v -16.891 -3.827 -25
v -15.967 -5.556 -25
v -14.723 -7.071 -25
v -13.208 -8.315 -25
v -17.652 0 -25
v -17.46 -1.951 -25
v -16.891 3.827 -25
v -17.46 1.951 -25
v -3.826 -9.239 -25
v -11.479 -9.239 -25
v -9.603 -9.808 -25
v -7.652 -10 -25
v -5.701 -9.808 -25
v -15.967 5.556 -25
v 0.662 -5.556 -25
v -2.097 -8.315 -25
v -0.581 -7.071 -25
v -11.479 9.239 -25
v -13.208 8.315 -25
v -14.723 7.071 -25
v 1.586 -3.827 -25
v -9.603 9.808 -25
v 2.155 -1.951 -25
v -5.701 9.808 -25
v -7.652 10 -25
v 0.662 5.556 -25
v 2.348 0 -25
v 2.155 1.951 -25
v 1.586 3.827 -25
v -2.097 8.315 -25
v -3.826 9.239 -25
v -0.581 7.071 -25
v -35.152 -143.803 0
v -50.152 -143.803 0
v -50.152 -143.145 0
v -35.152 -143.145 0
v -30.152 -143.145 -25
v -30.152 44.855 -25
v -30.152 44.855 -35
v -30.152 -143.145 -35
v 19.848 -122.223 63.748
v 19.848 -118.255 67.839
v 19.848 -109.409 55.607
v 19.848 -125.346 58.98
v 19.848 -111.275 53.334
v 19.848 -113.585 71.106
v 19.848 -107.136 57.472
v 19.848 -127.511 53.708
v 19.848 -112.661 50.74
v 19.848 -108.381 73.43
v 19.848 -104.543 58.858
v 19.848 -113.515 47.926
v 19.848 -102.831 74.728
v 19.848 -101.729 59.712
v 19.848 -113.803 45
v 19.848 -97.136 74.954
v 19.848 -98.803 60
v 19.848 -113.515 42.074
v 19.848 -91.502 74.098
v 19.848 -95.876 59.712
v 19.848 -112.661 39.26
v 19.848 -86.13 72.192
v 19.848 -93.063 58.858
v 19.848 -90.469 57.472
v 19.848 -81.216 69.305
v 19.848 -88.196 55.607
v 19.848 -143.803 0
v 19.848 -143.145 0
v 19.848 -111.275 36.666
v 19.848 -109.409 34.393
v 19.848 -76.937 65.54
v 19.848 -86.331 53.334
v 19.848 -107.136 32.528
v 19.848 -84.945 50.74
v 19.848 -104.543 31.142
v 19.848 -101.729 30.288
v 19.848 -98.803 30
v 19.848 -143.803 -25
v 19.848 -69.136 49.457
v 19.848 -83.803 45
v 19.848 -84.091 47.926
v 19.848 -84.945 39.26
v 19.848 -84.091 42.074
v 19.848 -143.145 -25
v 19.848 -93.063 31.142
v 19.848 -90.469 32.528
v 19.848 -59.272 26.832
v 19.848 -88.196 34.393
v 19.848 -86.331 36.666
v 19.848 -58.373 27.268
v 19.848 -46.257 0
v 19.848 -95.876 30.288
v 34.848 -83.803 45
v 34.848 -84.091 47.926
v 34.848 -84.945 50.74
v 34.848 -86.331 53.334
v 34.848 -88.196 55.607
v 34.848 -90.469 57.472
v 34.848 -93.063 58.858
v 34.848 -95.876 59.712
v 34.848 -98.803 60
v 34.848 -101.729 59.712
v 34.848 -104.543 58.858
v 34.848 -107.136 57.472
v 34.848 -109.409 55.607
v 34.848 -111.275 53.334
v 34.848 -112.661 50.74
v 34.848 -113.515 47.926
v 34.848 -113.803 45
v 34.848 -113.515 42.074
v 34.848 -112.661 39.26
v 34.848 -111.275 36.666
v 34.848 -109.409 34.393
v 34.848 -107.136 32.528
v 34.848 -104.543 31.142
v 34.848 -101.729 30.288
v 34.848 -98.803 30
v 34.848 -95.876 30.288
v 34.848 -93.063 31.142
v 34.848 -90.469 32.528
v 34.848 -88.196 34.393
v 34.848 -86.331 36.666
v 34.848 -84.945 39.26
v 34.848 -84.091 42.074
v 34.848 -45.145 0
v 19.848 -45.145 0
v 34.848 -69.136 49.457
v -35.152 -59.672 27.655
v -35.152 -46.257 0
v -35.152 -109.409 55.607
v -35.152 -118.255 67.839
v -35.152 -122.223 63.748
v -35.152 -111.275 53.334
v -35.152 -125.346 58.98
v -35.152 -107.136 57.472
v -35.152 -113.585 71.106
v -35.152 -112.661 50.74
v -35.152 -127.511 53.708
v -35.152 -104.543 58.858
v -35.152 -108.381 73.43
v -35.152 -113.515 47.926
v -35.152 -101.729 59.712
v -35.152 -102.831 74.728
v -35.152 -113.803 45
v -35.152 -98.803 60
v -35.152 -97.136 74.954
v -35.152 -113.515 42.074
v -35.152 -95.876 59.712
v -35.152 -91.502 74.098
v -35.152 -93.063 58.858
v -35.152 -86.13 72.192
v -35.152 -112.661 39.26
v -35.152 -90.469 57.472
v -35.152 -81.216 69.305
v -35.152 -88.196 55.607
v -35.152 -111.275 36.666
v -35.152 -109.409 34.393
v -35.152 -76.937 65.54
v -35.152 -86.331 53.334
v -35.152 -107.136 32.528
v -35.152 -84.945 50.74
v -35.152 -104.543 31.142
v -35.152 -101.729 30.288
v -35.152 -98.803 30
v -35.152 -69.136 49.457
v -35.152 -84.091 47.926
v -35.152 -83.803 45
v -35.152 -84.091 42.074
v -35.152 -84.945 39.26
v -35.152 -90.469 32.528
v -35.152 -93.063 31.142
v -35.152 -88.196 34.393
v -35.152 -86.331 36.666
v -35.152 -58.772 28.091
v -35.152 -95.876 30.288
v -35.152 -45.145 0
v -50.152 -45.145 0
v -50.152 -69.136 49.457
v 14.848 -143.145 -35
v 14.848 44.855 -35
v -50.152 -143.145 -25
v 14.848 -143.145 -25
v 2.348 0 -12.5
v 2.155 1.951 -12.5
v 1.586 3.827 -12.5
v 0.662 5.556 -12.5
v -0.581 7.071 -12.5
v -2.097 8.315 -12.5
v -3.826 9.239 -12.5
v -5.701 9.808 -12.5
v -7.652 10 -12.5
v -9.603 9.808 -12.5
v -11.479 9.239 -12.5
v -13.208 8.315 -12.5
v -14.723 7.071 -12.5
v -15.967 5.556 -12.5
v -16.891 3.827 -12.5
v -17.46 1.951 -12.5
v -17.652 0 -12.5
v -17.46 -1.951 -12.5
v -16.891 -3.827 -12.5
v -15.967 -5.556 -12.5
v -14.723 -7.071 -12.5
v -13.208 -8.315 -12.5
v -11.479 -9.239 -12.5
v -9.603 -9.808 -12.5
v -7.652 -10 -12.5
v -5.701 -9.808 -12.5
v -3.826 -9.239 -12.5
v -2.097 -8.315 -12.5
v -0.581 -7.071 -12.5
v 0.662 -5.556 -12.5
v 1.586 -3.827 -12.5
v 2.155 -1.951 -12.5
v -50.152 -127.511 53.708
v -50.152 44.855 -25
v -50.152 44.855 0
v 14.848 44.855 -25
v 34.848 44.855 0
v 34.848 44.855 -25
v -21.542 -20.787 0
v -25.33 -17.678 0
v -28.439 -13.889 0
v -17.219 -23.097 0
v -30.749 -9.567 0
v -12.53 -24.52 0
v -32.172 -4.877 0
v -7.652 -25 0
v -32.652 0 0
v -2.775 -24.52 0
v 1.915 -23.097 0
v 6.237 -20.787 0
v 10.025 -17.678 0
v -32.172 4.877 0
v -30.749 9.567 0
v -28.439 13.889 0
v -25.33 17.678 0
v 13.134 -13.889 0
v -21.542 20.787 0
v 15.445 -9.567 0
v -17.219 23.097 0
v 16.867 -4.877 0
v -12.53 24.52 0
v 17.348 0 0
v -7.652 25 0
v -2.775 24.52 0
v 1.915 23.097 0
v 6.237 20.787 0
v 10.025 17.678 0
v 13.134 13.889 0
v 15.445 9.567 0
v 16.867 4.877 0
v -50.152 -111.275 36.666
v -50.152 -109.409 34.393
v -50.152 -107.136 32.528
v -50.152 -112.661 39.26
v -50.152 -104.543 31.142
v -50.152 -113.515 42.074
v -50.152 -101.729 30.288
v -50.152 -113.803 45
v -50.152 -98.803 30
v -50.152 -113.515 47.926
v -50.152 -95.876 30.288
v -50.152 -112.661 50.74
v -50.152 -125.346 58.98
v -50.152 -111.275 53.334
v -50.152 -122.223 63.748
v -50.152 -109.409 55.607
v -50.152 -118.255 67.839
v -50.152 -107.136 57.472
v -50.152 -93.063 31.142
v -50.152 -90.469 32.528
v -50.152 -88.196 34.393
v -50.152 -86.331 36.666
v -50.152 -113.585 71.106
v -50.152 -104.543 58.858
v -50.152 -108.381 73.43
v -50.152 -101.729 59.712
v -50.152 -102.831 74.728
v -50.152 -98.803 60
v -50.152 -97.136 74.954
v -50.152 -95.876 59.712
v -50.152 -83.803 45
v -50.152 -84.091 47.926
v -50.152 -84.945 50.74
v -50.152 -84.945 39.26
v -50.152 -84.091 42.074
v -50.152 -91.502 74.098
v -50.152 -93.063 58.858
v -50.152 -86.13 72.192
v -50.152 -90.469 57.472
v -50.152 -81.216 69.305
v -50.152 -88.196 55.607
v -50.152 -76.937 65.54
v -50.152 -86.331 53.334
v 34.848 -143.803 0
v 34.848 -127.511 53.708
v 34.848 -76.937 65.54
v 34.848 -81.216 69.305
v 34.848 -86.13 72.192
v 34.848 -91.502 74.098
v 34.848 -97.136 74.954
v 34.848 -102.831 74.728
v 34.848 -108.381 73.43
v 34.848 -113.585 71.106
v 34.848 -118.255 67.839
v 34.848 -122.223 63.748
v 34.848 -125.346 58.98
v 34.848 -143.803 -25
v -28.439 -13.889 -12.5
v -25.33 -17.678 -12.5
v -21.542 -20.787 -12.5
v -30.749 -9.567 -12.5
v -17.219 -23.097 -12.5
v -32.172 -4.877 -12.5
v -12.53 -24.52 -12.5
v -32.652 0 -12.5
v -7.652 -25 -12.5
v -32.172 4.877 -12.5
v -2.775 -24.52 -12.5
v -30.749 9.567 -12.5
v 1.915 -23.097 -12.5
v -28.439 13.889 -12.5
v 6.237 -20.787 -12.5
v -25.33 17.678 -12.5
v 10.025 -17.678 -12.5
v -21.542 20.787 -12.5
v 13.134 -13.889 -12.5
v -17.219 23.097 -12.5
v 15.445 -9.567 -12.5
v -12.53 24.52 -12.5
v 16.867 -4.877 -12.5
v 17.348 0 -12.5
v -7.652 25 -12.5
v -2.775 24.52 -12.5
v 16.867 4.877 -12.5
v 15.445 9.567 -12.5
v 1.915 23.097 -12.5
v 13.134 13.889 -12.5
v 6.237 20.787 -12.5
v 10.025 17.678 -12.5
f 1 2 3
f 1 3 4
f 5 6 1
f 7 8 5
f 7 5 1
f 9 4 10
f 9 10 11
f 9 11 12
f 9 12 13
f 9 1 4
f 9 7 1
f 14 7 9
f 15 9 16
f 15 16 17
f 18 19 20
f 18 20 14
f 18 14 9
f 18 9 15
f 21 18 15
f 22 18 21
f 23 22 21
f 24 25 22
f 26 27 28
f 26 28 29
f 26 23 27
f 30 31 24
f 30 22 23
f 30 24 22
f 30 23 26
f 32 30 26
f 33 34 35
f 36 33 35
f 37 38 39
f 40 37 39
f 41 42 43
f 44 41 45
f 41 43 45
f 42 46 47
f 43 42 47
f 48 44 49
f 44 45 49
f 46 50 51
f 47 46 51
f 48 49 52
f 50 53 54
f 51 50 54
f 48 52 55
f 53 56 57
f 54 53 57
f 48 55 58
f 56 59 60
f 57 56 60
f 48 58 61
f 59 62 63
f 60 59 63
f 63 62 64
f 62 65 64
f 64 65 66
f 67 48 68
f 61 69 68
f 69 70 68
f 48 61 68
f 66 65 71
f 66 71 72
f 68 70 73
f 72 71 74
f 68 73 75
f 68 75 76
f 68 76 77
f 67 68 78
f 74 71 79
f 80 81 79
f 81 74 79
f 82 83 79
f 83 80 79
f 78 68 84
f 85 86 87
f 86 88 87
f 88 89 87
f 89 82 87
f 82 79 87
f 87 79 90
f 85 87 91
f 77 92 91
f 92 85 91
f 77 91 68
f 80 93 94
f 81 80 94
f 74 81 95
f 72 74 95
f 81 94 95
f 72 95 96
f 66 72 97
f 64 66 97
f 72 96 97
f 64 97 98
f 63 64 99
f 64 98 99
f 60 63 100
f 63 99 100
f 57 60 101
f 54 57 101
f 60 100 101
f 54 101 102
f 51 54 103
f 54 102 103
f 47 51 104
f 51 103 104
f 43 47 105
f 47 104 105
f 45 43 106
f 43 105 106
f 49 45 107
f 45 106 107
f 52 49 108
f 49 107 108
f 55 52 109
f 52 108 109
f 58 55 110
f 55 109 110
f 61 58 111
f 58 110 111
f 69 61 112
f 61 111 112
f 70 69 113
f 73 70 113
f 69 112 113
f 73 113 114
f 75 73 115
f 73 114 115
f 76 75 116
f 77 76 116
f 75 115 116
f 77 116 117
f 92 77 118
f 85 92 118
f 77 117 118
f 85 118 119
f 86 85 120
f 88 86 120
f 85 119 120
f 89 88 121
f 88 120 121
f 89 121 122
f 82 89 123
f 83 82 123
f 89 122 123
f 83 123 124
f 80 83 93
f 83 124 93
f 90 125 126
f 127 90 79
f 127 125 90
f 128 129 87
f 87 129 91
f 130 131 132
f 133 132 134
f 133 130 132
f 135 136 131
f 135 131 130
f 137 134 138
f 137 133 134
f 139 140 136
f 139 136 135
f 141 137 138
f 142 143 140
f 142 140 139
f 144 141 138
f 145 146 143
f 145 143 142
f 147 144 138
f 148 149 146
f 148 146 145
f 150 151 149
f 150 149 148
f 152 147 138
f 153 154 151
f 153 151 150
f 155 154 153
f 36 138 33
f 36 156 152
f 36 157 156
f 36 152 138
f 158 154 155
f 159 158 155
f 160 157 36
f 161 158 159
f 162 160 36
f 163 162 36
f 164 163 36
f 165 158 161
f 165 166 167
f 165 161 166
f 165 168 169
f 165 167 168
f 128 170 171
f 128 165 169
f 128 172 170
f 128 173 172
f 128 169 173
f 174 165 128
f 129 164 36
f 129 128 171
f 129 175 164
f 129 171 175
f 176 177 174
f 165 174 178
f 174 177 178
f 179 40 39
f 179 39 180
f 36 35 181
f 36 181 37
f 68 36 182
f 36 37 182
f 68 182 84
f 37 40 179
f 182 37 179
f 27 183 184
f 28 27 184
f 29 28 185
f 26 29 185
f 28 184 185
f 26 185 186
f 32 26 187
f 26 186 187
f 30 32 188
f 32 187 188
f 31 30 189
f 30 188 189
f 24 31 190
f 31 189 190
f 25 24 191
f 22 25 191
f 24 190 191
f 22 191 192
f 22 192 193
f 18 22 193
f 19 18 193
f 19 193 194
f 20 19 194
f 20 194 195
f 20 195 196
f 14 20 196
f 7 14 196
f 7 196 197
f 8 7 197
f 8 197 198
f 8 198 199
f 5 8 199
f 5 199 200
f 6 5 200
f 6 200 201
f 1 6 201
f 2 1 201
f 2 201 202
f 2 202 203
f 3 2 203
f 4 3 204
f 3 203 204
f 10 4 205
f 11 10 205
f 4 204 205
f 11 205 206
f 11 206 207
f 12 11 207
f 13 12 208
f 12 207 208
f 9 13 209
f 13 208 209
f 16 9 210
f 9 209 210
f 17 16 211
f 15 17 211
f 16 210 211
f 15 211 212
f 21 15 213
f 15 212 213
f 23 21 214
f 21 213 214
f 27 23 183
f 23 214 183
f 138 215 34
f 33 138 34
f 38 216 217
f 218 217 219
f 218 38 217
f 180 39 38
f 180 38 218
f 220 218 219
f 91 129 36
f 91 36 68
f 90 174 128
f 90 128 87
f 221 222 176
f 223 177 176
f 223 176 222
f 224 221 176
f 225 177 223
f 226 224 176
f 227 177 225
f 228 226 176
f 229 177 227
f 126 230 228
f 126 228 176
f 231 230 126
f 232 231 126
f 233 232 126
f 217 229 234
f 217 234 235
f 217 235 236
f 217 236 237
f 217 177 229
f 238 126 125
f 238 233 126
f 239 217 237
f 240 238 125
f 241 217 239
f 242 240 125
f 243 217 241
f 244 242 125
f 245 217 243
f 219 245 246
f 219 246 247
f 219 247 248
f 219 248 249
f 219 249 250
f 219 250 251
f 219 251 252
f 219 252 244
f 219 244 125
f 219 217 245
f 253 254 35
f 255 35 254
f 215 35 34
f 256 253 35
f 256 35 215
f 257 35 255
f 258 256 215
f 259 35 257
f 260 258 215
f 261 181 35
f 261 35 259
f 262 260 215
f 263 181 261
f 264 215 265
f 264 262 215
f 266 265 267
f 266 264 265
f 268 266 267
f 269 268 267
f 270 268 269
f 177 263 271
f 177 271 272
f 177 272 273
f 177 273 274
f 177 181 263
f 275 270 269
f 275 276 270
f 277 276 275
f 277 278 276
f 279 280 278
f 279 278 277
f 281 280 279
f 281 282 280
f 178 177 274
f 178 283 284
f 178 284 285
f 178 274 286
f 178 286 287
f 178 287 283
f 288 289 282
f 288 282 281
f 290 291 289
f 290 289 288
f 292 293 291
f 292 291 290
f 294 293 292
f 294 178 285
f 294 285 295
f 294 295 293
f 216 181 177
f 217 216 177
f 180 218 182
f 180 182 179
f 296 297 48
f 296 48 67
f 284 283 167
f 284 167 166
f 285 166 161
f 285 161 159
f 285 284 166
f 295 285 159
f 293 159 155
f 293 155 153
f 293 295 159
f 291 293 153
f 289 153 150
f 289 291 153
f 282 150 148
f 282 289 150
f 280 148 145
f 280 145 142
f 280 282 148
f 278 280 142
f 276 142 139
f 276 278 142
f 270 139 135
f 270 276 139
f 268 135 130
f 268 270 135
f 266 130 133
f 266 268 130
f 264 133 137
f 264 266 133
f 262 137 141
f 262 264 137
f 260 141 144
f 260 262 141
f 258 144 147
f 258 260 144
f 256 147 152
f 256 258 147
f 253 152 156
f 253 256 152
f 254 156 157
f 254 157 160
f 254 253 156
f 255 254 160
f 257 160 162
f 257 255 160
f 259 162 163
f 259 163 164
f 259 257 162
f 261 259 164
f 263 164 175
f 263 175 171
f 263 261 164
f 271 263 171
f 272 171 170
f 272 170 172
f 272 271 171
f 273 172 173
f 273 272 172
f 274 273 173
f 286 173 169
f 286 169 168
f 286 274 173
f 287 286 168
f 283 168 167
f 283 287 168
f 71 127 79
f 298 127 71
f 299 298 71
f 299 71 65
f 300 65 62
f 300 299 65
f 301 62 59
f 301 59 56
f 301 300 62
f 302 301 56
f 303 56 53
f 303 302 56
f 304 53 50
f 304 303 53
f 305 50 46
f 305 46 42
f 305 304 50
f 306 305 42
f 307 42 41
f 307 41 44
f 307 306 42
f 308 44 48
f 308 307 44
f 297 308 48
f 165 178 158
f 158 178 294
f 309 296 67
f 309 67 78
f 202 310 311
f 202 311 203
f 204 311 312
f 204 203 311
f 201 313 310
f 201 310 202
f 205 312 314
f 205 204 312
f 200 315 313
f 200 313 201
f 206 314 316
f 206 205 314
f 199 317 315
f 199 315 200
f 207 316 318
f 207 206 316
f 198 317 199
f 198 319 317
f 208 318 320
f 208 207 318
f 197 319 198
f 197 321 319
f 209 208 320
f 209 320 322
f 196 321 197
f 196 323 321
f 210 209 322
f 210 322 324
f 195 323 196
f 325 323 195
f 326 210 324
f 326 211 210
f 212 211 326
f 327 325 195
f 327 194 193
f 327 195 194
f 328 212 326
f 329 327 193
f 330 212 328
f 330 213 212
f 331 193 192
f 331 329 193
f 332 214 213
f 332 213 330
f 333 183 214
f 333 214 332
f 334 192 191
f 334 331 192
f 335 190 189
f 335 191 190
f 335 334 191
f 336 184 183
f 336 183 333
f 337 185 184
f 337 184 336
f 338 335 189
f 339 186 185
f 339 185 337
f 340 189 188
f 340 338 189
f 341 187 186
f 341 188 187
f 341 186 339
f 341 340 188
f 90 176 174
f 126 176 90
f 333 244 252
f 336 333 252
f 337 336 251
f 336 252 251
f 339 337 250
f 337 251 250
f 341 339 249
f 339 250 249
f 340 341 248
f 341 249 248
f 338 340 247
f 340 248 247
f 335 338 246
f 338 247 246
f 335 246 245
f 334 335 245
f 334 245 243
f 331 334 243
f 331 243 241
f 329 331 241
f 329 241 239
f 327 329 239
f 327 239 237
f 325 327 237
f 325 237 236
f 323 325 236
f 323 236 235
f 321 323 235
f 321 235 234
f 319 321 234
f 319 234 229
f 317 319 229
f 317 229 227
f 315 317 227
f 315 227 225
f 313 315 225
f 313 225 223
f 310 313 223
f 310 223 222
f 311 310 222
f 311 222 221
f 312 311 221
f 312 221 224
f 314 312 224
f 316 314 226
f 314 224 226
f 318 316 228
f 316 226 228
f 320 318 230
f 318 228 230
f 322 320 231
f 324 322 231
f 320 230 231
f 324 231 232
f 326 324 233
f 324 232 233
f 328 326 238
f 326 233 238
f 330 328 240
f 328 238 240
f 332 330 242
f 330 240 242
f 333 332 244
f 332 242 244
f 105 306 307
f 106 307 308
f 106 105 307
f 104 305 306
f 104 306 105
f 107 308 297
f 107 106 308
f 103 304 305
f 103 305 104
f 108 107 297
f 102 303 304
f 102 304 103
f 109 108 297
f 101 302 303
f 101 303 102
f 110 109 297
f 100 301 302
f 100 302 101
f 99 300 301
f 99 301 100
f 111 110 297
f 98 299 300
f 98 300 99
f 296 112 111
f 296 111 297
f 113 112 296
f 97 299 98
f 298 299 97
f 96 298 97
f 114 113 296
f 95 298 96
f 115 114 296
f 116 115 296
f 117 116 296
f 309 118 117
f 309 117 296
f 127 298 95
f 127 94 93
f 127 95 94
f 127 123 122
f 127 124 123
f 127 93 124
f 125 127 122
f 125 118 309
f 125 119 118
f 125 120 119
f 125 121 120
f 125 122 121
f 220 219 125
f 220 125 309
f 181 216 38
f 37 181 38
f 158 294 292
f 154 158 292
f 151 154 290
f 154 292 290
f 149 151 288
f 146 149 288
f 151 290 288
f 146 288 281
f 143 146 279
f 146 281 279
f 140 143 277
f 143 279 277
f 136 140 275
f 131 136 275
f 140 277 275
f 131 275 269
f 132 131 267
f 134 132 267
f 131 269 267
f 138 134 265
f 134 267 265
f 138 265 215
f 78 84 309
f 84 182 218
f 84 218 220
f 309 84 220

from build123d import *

# Parameters (mm, degrees)
SKETCH1_W            = 85
SKETCH1_H            = 90
SKETCH1_R            = 25
BOSS_EXTRUDE1_DEPTH  = 25
SKETCH1_3_R          = 25
SKETCH1_3_R_2        = 10
BOSS_EXTRUDE2_DEPTH  = 25
SKETCH1_5_R          = 10
CUT_EXTRUDE1_DEPTH   = 72.960881466
SKETCH1_6_R          = 25
SKETCH1_6_R_2        = 10
CUT_EXTRUDE2_DEPTH   = 12.5
SKETCH3_R            = 15
SKETCH3_W            = 25
SKETCH3_H            = 98.657332742
BOSS_EXTRUDE3_DEPTH  = 15
SKETCH5_W            = 25
SKETCH5_H            = 98.657332742
CUT_EXTRUDE3_DEPTH   = 15
SKETCH8_W            = 85
SKETCH8_H            = 25
BOSS_EXTRUDE8_DEPTH  = 98
BOSS_EXTRUDE9_DEPTH  = 1
SKETCH12_W           = 45
SKETCH12_H           = 10
BOSS_EXTRUDE11_DEPTH = 188
CUT_EXTRUDE4_DEPTH   = 177.647203174


with BuildPart() as part:
    # Sketch1 → Boss-Extrude1 (new body)
    with BuildSketch(Plane.XY):
        with Locations((-7.652354571, -0.145429363)):
            Rectangle(SKETCH1_W, SKETCH1_H)
        with Locations((-7.652354571, 0)):
            Circle(SKETCH1_R, mode=Mode.SUBTRACT)
    extrude(amount=-BOSS_EXTRUDE1_DEPTH)

    # Sketch3 → Boss-Extrude3 (add)
    # profile 1 of 2: a face of its own
    with BuildSketch(Plane(origin=(34.847645429, 0, 0), x_dir=(0, 0, -1), z_dir=(1, 0, 0))):
        with BuildLine():
            Line((0, -143.802762105), (0, -45.145429363))
            Line((0, -45.145429363), (-49.456840406, -69.135666299))
            Line((-49.456840406, -69.135666299), (-65.54026385, -76.937319943))
            ThreePointArc((-65.54026385, -76.937319943), (-74.211212735, -105.636871453), (-53.708286934, -127.511049039))
            Line((-53.708286934, -127.511049039), (0, -143.802762105))
        make_face()
        with Locations(Location((-45, -98.802762105, 0), (0, 0, 90))):
            Circle(SKETCH3_R, mode=Mode.SUBTRACT)
    # profile 2 of 2: a face of its own
    with BuildSketch(Plane(origin=(34.847645429, 0, 0), x_dir=(0, 0, -1), z_dir=(1, 0, 0))):
        with Locations((12.5, -94.474095734)):
            Rectangle(SKETCH3_W, SKETCH3_H)
    extrude(amount=-BOSS_EXTRUDE3_DEPTH)


with BuildPart() as body_2:
    # Sketch1<3> → Boss-Extrude2 (new body)
    # profile 1 of 2: a face of its own
    with BuildSketch(Plane.XY):
        with Locations((-7.652354571, 0)):
            Circle(SKETCH1_3_R)
        with Locations((-7.652354571, 0)):
            Circle(SKETCH1_3_R_2, mode=Mode.SUBTRACT)
    # profile 2 of 2: a face of its own
    with BuildSketch(Plane.XY):
        with Locations((-7.652354571, 0)):
            Circle(SKETCH1_3_R_2)
    extrude(amount=-BOSS_EXTRUDE2_DEPTH)

    # Sketch1<5> → Cut-Extrude1 (cut, through all)
    with BuildSketch(Plane.XY):
        with Locations((-7.652354571, 0)):
            Circle(SKETCH1_5_R)
    extrude(amount=-CUT_EXTRUDE1_DEPTH, mode=Mode.SUBTRACT)

    # Sketch1<6> → Cut-Extrude2 (cut)
    with BuildSketch(Plane.XY):
        with Locations((-7.652354571, 0)):
            Circle(SKETCH1_6_R)
        with Locations((-7.652354571, 0)):
            Circle(SKETCH1_6_R_2, mode=Mode.SUBTRACT)
    extrude(amount=-CUT_EXTRUDE2_DEPTH, mode=Mode.SUBTRACT)


with BuildPart() as body_3:
    # Mirror1: mirrored copy
    add(part.part.mirror(Plane(origin=(-7.652354571, 0, 0), x_dir=(0, 0, 1), z_dir=(1, 0, 0))))

    # Sketch5 → Cut-Extrude3 (cut)
    with BuildSketch(Plane.ZY.offset(50.152354571)):
        with Locations((-12.5, -94.474095734)):
            Rectangle(SKETCH5_W, SKETCH5_H)
    extrude(amount=-CUT_EXTRUDE3_DEPTH, mode=Mode.SUBTRACT)


with BuildPart() as cut_extrude3_piece_1:
    # of the separate pieces the step leaves, piece 1, a body of its own (cut_extrude3_pieces)
    add(body_3.part.solids().sort_by_distance((34.847645429, -45.145429363, 0))[0])


with BuildPart() as cut_extrude3_piece_2:
    # of the separate pieces the step leaves, piece 2, a body of its own (cut_extrude3_pieces)
    add(body_3.part.solids().sort_by_distance((-35.152354571, -76.937319943, 65.54026385))[0])


with BuildPart() as part_1:
    add(part.part)

    add(cut_extrude3_piece_1.part)  # Boss-Extrude8 merges Cut-Extrude3 piece 1

    add(cut_extrude3_piece_2.part)  # Boss-Extrude8 merges Cut-Extrude3 piece 2
    # Sketch8 → Boss-Extrude8 (add)
    with BuildSketch(Plane.XZ.offset(45.145429363)):
        with Locations((-7.652354571, -12.5)):
            Rectangle(SKETCH8_W, SKETCH8_H)
    extrude(amount=BOSS_EXTRUDE8_DEPTH)

    # Sketch9 → Boss-Extrude9 (add)
    with BuildSketch(Plane(origin=(0, -36.5462155, -17.727625982), x_dir=(1, 0, 0), z_dir=(0, 0.8997343711779642, 0.4364379237887027))):
        Polygon((-50.152354571, -51.174548766), (34.847645429, -49.760817749), (34.847645429, -19.70317746), (-50.152354571, -19.70317746), align=None)
    extrude(amount=-BOSS_EXTRUDE9_DEPTH)

    add(body_2.part)  # Boss-Extrude11 merges body 2
    # Sketch12 → Boss-Extrude11 (add)
    with BuildSketch(Plane(origin=(0, 44.854570637, 0), x_dir=(1, 0, 0), z_dir=(0, 1, 0))):
        with Locations((-7.652354571, 30)):
            Rectangle(SKETCH12_W, SKETCH12_H)
    extrude(amount=-BOSS_EXTRUDE11_DEPTH)

    # Sketch11 → Cut-Extrude4 (cut, through all)
    with BuildSketch(Plane(origin=(19.847645429, 0, 0), x_dir=(0, 0, -1), z_dir=(1, 0, 0))):
        Polygon((0, -143.802762105), (-26.854143467, -135.656905572), (-27, -143.802762105), align=None)
    extrude(amount=-CUT_EXTRUDE4_DEPTH, mode=Mode.SUBTRACT)


solid = part_1.part
